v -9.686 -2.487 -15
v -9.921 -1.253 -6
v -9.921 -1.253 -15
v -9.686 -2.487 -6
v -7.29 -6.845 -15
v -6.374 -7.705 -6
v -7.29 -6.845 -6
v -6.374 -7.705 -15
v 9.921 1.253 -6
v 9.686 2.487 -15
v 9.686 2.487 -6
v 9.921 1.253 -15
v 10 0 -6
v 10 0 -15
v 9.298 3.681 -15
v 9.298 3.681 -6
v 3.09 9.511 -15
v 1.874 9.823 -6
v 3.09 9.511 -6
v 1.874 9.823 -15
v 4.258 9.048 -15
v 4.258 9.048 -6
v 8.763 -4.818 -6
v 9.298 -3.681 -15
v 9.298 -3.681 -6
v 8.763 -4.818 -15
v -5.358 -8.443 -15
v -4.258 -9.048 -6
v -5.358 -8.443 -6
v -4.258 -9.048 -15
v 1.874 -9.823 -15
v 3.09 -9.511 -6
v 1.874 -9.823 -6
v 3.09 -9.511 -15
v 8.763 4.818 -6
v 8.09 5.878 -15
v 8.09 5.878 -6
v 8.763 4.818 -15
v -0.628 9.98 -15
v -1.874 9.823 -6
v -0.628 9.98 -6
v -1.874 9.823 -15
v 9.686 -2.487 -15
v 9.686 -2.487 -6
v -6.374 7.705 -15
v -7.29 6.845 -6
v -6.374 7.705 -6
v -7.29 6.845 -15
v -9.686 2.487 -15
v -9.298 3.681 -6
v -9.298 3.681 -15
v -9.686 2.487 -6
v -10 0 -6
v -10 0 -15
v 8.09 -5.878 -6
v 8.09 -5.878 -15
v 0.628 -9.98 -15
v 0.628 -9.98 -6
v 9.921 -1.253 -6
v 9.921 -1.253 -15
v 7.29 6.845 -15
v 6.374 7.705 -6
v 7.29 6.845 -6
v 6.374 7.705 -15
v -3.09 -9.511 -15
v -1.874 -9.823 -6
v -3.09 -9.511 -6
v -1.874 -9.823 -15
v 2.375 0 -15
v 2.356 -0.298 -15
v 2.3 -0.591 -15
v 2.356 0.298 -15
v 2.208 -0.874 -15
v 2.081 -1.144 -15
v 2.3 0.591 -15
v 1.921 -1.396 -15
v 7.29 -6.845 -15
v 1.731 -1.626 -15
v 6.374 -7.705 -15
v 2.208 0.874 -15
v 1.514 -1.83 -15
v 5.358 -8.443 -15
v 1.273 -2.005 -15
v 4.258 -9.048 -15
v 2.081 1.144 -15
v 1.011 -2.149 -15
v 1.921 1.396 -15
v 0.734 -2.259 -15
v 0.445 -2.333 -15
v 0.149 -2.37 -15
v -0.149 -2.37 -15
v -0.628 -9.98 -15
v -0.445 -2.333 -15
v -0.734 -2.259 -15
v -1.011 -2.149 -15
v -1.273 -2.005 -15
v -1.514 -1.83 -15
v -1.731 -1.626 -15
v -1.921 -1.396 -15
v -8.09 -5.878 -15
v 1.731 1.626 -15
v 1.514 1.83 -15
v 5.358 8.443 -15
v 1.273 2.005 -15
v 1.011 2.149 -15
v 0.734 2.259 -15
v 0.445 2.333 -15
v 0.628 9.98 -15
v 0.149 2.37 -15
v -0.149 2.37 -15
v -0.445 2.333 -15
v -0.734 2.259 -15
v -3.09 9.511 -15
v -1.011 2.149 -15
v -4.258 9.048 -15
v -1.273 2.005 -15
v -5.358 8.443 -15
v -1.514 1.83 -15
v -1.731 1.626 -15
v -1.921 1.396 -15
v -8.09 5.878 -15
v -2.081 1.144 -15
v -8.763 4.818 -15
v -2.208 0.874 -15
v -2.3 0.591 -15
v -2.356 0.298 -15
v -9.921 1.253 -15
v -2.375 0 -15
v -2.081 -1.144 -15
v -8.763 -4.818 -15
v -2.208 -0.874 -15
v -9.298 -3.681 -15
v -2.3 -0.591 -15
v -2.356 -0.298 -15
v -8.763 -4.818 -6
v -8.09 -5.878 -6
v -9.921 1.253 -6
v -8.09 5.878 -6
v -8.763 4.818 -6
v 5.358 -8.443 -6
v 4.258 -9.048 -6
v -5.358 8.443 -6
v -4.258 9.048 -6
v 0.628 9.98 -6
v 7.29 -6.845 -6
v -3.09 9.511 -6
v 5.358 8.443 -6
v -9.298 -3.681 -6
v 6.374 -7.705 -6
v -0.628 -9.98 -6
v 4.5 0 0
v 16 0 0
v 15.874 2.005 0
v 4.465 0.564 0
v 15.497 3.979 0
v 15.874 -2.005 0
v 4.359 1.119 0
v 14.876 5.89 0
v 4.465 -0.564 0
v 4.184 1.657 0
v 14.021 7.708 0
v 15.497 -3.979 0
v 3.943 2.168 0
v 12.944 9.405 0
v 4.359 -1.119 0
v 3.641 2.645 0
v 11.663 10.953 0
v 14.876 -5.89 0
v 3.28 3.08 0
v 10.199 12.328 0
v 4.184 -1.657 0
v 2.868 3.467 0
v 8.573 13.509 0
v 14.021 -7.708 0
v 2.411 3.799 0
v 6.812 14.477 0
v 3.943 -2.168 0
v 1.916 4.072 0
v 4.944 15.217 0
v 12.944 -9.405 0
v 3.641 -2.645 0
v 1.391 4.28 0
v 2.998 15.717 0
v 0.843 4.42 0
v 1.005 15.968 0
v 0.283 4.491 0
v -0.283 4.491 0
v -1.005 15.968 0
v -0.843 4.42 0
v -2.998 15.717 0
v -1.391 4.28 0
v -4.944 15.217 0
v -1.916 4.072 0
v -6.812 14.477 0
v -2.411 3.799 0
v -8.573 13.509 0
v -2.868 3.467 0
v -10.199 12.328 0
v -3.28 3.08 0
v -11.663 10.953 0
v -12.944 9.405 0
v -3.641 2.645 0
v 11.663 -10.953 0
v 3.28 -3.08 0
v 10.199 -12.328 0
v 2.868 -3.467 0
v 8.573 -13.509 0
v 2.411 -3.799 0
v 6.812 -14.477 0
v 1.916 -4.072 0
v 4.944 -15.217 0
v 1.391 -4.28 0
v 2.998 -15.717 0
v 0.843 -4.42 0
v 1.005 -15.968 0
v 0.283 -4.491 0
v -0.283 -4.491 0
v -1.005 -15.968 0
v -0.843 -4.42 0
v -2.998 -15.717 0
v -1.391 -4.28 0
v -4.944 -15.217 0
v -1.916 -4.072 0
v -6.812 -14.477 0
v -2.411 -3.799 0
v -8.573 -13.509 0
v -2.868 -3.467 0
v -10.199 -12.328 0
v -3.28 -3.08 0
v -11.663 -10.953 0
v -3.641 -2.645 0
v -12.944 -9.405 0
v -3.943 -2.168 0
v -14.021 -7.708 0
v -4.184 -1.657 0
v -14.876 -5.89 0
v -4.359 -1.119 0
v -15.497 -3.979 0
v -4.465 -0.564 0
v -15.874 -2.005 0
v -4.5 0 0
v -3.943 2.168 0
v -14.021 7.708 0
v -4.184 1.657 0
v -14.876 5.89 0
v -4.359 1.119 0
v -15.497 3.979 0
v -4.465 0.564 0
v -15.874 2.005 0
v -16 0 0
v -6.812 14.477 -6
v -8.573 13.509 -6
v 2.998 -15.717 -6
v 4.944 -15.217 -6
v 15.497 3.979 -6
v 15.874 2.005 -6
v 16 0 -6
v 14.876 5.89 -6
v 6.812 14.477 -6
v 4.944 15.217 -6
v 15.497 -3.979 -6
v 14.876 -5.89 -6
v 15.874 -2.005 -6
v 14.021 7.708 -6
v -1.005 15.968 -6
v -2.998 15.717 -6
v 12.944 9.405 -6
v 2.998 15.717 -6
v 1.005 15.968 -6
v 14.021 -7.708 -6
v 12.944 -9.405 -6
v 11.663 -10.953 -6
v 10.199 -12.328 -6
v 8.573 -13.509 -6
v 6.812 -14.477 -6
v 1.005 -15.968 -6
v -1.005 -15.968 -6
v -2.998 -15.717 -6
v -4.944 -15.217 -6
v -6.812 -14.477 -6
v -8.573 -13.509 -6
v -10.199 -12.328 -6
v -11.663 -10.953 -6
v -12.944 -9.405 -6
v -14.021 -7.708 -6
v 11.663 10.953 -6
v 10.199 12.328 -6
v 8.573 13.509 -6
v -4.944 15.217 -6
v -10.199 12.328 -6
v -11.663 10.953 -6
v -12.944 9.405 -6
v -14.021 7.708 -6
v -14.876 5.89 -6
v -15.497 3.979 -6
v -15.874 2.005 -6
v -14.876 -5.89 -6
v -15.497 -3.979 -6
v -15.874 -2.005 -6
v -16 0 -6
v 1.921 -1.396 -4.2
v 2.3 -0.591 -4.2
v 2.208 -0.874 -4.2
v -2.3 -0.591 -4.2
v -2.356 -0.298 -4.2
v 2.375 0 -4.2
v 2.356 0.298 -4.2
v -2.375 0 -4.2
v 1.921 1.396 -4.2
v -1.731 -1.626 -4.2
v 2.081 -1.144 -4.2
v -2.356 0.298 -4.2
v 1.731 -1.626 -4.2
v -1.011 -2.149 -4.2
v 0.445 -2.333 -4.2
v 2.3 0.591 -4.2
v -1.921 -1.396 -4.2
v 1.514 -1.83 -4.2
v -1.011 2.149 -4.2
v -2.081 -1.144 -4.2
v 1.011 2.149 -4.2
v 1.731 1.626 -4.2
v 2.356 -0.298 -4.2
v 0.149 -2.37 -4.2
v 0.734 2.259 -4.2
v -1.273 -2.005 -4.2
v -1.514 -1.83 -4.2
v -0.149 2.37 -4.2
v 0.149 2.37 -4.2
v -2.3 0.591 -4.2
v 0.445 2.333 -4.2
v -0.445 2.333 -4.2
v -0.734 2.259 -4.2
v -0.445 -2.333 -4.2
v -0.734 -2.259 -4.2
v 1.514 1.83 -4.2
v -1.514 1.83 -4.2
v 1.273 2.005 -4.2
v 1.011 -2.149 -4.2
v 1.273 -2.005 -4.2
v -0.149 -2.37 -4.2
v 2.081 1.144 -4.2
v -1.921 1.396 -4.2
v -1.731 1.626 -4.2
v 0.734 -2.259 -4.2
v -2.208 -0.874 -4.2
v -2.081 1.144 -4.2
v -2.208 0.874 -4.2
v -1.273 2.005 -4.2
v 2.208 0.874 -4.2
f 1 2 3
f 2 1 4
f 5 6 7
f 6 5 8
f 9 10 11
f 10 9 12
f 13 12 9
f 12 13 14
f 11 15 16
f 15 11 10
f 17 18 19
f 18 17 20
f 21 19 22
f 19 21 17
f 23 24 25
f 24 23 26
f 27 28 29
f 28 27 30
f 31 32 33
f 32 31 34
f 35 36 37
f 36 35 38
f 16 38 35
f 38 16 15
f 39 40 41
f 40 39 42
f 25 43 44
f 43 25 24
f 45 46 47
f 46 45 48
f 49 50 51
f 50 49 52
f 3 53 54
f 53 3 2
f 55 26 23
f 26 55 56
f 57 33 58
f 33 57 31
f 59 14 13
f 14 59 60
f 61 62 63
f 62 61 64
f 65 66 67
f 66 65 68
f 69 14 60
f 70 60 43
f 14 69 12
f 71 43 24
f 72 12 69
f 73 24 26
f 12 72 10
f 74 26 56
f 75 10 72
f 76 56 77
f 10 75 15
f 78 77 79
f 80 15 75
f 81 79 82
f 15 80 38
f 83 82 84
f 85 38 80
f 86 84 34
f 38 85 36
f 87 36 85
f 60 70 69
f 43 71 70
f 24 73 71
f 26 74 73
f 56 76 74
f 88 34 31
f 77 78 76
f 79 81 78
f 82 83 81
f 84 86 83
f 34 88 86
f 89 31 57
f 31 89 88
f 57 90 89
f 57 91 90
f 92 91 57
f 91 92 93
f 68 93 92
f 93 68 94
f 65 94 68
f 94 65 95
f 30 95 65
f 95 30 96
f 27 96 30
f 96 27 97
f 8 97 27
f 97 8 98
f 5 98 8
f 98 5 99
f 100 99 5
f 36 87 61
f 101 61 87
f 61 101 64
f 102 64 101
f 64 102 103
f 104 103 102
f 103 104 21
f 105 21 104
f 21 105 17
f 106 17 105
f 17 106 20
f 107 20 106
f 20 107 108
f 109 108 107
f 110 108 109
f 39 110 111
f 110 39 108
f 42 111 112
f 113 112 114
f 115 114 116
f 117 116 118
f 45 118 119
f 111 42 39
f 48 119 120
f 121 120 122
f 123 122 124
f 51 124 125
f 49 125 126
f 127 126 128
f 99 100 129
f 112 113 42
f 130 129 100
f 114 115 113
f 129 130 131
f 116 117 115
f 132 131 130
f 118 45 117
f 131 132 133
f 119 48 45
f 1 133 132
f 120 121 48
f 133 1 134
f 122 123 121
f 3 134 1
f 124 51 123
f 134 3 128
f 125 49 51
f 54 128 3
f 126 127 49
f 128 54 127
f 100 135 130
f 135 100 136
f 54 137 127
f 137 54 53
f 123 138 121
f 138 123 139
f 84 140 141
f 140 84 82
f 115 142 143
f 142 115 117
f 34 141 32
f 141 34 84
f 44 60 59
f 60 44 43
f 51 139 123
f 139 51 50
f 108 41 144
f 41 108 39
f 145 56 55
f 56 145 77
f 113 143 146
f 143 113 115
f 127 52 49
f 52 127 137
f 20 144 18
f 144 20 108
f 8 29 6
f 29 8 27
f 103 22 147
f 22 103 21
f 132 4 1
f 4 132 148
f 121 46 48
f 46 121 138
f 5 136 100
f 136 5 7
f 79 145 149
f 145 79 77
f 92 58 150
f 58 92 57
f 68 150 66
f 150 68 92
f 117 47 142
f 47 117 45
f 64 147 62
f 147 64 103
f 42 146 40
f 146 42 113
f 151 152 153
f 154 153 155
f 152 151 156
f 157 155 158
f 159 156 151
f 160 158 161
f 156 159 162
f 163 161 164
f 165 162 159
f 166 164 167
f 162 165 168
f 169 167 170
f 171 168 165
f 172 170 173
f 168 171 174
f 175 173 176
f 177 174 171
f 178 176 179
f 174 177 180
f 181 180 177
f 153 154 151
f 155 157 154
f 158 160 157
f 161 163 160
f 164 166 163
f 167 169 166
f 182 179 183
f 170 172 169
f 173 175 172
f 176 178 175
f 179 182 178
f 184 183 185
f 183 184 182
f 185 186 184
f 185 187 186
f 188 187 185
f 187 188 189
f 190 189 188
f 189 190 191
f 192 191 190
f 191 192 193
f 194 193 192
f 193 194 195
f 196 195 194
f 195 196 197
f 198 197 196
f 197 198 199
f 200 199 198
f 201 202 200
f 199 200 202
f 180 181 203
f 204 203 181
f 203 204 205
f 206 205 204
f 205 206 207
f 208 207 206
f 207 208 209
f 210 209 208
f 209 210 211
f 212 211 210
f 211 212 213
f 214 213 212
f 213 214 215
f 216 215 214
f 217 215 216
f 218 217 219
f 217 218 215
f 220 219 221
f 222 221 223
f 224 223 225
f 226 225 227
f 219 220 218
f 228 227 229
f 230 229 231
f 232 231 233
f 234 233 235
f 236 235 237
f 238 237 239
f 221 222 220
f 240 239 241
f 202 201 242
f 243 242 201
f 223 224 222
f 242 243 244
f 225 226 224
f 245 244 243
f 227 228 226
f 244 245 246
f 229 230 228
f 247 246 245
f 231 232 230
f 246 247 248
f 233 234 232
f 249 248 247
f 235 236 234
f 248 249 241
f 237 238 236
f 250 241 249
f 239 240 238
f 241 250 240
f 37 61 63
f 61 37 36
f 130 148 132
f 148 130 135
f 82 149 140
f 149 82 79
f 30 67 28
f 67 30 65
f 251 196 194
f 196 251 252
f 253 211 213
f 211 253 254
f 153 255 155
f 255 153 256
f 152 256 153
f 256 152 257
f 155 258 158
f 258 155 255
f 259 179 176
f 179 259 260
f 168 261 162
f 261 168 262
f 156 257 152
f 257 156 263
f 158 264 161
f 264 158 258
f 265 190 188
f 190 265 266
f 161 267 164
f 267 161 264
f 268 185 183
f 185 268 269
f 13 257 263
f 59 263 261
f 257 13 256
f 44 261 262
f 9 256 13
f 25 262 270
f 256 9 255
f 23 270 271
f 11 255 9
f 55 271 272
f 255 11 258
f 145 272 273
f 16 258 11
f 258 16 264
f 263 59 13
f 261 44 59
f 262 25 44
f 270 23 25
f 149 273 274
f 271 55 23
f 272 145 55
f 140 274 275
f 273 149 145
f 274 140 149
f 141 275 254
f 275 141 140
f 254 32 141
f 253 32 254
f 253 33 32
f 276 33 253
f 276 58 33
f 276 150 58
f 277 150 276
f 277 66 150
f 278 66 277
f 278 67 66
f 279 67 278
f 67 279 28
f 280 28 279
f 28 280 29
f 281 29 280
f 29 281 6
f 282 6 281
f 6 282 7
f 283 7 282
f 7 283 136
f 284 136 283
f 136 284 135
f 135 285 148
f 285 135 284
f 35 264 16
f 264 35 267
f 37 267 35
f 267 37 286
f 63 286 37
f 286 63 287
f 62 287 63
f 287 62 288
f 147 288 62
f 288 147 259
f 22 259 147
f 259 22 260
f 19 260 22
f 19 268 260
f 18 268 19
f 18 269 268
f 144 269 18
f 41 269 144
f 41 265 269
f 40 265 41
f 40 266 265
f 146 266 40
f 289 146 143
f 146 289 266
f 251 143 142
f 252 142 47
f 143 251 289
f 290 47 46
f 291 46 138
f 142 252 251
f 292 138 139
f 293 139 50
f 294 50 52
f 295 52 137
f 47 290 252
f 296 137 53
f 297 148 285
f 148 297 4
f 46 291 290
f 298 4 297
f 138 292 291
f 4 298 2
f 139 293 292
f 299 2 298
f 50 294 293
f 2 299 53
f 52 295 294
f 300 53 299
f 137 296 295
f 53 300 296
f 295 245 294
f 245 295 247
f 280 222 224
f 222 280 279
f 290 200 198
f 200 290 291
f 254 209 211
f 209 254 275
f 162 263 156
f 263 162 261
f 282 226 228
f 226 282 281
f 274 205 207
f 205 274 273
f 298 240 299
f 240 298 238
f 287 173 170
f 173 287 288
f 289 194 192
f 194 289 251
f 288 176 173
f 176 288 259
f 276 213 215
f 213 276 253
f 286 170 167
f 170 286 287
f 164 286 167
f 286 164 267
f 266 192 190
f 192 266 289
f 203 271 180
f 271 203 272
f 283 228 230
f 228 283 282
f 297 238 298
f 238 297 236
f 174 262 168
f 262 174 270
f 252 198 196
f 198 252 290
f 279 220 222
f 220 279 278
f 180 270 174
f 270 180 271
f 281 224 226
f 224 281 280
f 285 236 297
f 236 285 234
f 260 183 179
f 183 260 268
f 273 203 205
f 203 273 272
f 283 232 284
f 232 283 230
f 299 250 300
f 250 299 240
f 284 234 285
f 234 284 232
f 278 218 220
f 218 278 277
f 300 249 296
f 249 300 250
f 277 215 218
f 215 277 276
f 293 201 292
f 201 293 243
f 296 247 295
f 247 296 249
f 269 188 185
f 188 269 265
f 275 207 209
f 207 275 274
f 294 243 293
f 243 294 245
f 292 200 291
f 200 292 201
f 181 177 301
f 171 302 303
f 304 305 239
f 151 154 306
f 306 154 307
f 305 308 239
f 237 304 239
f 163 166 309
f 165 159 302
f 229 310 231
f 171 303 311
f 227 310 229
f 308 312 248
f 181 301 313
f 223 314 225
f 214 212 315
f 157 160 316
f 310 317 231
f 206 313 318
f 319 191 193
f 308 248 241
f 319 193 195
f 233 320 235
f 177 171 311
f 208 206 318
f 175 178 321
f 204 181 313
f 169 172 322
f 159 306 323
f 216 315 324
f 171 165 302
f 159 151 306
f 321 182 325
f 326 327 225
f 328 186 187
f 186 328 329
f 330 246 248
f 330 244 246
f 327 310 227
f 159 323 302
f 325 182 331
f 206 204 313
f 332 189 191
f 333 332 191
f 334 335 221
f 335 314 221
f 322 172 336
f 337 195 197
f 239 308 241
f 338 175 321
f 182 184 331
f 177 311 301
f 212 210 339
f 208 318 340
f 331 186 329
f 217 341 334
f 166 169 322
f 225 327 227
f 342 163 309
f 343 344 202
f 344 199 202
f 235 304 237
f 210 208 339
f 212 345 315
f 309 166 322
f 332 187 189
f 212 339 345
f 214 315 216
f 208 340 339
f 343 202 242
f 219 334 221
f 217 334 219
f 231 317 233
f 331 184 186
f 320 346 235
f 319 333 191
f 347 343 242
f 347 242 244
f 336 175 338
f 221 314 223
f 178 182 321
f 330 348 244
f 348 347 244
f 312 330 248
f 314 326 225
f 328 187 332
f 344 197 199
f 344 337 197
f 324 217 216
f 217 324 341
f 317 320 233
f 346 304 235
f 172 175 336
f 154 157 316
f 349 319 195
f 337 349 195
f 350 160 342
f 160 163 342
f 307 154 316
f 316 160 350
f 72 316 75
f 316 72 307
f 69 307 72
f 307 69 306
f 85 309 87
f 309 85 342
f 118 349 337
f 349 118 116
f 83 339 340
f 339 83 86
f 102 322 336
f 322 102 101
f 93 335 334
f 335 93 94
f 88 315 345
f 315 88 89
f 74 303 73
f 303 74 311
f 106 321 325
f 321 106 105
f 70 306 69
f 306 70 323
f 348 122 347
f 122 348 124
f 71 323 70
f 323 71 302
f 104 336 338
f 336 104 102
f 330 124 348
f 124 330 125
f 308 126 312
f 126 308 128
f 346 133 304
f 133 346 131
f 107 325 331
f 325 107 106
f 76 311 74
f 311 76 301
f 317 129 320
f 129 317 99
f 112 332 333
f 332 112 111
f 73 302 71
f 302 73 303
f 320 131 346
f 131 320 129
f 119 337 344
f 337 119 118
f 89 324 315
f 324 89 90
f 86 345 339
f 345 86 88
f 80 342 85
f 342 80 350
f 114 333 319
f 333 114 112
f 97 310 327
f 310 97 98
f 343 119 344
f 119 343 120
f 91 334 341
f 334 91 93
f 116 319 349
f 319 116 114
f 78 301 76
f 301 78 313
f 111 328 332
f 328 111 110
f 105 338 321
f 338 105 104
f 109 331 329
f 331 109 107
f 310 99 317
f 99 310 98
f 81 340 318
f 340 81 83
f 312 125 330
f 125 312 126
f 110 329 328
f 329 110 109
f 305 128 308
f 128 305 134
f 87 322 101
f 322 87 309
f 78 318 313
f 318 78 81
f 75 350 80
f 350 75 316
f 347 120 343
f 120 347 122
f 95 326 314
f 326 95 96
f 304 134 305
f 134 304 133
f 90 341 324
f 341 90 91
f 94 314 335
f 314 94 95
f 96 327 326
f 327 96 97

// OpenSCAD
$fn = 50;


difference() {
	union() {
		translate(v = [0, 0, -15.0000000000]) {
			cylinder(h = 15, r = 10.0000000000);
		}
		translate(v = [0, 0, -6.0000000000]) {
			cylinder(h = 6, r = 16.0000000000);
		}
	}
	union() {
		translate(v = [0, 0, 0]) {
			rotate(a = [0, 0, 0]) {
				difference() {
					union() {
						#translate(v = [0, 0, -15.0000000000]) {
							cylinder(h = 15, r = 2.2500000000);
						}
						#translate(v = [0, 0, -4.2000000000]) {
							cylinder(h = 4.2000000000, r = 10.0000000000, r1 = 2.3750000000, r2 = 4.5000000000);
						}
						#translate(v = [0, 0, -15.0000000000]) {
							cylinder(h = 15, r = 2.3750000000);
						}
						#translate(v = [0, 0, -15.0000000000]) {
							cylinder(h = 15, r = 2.2500000000);
						}
					}
					union();
				}
			}
		}
	}
}
